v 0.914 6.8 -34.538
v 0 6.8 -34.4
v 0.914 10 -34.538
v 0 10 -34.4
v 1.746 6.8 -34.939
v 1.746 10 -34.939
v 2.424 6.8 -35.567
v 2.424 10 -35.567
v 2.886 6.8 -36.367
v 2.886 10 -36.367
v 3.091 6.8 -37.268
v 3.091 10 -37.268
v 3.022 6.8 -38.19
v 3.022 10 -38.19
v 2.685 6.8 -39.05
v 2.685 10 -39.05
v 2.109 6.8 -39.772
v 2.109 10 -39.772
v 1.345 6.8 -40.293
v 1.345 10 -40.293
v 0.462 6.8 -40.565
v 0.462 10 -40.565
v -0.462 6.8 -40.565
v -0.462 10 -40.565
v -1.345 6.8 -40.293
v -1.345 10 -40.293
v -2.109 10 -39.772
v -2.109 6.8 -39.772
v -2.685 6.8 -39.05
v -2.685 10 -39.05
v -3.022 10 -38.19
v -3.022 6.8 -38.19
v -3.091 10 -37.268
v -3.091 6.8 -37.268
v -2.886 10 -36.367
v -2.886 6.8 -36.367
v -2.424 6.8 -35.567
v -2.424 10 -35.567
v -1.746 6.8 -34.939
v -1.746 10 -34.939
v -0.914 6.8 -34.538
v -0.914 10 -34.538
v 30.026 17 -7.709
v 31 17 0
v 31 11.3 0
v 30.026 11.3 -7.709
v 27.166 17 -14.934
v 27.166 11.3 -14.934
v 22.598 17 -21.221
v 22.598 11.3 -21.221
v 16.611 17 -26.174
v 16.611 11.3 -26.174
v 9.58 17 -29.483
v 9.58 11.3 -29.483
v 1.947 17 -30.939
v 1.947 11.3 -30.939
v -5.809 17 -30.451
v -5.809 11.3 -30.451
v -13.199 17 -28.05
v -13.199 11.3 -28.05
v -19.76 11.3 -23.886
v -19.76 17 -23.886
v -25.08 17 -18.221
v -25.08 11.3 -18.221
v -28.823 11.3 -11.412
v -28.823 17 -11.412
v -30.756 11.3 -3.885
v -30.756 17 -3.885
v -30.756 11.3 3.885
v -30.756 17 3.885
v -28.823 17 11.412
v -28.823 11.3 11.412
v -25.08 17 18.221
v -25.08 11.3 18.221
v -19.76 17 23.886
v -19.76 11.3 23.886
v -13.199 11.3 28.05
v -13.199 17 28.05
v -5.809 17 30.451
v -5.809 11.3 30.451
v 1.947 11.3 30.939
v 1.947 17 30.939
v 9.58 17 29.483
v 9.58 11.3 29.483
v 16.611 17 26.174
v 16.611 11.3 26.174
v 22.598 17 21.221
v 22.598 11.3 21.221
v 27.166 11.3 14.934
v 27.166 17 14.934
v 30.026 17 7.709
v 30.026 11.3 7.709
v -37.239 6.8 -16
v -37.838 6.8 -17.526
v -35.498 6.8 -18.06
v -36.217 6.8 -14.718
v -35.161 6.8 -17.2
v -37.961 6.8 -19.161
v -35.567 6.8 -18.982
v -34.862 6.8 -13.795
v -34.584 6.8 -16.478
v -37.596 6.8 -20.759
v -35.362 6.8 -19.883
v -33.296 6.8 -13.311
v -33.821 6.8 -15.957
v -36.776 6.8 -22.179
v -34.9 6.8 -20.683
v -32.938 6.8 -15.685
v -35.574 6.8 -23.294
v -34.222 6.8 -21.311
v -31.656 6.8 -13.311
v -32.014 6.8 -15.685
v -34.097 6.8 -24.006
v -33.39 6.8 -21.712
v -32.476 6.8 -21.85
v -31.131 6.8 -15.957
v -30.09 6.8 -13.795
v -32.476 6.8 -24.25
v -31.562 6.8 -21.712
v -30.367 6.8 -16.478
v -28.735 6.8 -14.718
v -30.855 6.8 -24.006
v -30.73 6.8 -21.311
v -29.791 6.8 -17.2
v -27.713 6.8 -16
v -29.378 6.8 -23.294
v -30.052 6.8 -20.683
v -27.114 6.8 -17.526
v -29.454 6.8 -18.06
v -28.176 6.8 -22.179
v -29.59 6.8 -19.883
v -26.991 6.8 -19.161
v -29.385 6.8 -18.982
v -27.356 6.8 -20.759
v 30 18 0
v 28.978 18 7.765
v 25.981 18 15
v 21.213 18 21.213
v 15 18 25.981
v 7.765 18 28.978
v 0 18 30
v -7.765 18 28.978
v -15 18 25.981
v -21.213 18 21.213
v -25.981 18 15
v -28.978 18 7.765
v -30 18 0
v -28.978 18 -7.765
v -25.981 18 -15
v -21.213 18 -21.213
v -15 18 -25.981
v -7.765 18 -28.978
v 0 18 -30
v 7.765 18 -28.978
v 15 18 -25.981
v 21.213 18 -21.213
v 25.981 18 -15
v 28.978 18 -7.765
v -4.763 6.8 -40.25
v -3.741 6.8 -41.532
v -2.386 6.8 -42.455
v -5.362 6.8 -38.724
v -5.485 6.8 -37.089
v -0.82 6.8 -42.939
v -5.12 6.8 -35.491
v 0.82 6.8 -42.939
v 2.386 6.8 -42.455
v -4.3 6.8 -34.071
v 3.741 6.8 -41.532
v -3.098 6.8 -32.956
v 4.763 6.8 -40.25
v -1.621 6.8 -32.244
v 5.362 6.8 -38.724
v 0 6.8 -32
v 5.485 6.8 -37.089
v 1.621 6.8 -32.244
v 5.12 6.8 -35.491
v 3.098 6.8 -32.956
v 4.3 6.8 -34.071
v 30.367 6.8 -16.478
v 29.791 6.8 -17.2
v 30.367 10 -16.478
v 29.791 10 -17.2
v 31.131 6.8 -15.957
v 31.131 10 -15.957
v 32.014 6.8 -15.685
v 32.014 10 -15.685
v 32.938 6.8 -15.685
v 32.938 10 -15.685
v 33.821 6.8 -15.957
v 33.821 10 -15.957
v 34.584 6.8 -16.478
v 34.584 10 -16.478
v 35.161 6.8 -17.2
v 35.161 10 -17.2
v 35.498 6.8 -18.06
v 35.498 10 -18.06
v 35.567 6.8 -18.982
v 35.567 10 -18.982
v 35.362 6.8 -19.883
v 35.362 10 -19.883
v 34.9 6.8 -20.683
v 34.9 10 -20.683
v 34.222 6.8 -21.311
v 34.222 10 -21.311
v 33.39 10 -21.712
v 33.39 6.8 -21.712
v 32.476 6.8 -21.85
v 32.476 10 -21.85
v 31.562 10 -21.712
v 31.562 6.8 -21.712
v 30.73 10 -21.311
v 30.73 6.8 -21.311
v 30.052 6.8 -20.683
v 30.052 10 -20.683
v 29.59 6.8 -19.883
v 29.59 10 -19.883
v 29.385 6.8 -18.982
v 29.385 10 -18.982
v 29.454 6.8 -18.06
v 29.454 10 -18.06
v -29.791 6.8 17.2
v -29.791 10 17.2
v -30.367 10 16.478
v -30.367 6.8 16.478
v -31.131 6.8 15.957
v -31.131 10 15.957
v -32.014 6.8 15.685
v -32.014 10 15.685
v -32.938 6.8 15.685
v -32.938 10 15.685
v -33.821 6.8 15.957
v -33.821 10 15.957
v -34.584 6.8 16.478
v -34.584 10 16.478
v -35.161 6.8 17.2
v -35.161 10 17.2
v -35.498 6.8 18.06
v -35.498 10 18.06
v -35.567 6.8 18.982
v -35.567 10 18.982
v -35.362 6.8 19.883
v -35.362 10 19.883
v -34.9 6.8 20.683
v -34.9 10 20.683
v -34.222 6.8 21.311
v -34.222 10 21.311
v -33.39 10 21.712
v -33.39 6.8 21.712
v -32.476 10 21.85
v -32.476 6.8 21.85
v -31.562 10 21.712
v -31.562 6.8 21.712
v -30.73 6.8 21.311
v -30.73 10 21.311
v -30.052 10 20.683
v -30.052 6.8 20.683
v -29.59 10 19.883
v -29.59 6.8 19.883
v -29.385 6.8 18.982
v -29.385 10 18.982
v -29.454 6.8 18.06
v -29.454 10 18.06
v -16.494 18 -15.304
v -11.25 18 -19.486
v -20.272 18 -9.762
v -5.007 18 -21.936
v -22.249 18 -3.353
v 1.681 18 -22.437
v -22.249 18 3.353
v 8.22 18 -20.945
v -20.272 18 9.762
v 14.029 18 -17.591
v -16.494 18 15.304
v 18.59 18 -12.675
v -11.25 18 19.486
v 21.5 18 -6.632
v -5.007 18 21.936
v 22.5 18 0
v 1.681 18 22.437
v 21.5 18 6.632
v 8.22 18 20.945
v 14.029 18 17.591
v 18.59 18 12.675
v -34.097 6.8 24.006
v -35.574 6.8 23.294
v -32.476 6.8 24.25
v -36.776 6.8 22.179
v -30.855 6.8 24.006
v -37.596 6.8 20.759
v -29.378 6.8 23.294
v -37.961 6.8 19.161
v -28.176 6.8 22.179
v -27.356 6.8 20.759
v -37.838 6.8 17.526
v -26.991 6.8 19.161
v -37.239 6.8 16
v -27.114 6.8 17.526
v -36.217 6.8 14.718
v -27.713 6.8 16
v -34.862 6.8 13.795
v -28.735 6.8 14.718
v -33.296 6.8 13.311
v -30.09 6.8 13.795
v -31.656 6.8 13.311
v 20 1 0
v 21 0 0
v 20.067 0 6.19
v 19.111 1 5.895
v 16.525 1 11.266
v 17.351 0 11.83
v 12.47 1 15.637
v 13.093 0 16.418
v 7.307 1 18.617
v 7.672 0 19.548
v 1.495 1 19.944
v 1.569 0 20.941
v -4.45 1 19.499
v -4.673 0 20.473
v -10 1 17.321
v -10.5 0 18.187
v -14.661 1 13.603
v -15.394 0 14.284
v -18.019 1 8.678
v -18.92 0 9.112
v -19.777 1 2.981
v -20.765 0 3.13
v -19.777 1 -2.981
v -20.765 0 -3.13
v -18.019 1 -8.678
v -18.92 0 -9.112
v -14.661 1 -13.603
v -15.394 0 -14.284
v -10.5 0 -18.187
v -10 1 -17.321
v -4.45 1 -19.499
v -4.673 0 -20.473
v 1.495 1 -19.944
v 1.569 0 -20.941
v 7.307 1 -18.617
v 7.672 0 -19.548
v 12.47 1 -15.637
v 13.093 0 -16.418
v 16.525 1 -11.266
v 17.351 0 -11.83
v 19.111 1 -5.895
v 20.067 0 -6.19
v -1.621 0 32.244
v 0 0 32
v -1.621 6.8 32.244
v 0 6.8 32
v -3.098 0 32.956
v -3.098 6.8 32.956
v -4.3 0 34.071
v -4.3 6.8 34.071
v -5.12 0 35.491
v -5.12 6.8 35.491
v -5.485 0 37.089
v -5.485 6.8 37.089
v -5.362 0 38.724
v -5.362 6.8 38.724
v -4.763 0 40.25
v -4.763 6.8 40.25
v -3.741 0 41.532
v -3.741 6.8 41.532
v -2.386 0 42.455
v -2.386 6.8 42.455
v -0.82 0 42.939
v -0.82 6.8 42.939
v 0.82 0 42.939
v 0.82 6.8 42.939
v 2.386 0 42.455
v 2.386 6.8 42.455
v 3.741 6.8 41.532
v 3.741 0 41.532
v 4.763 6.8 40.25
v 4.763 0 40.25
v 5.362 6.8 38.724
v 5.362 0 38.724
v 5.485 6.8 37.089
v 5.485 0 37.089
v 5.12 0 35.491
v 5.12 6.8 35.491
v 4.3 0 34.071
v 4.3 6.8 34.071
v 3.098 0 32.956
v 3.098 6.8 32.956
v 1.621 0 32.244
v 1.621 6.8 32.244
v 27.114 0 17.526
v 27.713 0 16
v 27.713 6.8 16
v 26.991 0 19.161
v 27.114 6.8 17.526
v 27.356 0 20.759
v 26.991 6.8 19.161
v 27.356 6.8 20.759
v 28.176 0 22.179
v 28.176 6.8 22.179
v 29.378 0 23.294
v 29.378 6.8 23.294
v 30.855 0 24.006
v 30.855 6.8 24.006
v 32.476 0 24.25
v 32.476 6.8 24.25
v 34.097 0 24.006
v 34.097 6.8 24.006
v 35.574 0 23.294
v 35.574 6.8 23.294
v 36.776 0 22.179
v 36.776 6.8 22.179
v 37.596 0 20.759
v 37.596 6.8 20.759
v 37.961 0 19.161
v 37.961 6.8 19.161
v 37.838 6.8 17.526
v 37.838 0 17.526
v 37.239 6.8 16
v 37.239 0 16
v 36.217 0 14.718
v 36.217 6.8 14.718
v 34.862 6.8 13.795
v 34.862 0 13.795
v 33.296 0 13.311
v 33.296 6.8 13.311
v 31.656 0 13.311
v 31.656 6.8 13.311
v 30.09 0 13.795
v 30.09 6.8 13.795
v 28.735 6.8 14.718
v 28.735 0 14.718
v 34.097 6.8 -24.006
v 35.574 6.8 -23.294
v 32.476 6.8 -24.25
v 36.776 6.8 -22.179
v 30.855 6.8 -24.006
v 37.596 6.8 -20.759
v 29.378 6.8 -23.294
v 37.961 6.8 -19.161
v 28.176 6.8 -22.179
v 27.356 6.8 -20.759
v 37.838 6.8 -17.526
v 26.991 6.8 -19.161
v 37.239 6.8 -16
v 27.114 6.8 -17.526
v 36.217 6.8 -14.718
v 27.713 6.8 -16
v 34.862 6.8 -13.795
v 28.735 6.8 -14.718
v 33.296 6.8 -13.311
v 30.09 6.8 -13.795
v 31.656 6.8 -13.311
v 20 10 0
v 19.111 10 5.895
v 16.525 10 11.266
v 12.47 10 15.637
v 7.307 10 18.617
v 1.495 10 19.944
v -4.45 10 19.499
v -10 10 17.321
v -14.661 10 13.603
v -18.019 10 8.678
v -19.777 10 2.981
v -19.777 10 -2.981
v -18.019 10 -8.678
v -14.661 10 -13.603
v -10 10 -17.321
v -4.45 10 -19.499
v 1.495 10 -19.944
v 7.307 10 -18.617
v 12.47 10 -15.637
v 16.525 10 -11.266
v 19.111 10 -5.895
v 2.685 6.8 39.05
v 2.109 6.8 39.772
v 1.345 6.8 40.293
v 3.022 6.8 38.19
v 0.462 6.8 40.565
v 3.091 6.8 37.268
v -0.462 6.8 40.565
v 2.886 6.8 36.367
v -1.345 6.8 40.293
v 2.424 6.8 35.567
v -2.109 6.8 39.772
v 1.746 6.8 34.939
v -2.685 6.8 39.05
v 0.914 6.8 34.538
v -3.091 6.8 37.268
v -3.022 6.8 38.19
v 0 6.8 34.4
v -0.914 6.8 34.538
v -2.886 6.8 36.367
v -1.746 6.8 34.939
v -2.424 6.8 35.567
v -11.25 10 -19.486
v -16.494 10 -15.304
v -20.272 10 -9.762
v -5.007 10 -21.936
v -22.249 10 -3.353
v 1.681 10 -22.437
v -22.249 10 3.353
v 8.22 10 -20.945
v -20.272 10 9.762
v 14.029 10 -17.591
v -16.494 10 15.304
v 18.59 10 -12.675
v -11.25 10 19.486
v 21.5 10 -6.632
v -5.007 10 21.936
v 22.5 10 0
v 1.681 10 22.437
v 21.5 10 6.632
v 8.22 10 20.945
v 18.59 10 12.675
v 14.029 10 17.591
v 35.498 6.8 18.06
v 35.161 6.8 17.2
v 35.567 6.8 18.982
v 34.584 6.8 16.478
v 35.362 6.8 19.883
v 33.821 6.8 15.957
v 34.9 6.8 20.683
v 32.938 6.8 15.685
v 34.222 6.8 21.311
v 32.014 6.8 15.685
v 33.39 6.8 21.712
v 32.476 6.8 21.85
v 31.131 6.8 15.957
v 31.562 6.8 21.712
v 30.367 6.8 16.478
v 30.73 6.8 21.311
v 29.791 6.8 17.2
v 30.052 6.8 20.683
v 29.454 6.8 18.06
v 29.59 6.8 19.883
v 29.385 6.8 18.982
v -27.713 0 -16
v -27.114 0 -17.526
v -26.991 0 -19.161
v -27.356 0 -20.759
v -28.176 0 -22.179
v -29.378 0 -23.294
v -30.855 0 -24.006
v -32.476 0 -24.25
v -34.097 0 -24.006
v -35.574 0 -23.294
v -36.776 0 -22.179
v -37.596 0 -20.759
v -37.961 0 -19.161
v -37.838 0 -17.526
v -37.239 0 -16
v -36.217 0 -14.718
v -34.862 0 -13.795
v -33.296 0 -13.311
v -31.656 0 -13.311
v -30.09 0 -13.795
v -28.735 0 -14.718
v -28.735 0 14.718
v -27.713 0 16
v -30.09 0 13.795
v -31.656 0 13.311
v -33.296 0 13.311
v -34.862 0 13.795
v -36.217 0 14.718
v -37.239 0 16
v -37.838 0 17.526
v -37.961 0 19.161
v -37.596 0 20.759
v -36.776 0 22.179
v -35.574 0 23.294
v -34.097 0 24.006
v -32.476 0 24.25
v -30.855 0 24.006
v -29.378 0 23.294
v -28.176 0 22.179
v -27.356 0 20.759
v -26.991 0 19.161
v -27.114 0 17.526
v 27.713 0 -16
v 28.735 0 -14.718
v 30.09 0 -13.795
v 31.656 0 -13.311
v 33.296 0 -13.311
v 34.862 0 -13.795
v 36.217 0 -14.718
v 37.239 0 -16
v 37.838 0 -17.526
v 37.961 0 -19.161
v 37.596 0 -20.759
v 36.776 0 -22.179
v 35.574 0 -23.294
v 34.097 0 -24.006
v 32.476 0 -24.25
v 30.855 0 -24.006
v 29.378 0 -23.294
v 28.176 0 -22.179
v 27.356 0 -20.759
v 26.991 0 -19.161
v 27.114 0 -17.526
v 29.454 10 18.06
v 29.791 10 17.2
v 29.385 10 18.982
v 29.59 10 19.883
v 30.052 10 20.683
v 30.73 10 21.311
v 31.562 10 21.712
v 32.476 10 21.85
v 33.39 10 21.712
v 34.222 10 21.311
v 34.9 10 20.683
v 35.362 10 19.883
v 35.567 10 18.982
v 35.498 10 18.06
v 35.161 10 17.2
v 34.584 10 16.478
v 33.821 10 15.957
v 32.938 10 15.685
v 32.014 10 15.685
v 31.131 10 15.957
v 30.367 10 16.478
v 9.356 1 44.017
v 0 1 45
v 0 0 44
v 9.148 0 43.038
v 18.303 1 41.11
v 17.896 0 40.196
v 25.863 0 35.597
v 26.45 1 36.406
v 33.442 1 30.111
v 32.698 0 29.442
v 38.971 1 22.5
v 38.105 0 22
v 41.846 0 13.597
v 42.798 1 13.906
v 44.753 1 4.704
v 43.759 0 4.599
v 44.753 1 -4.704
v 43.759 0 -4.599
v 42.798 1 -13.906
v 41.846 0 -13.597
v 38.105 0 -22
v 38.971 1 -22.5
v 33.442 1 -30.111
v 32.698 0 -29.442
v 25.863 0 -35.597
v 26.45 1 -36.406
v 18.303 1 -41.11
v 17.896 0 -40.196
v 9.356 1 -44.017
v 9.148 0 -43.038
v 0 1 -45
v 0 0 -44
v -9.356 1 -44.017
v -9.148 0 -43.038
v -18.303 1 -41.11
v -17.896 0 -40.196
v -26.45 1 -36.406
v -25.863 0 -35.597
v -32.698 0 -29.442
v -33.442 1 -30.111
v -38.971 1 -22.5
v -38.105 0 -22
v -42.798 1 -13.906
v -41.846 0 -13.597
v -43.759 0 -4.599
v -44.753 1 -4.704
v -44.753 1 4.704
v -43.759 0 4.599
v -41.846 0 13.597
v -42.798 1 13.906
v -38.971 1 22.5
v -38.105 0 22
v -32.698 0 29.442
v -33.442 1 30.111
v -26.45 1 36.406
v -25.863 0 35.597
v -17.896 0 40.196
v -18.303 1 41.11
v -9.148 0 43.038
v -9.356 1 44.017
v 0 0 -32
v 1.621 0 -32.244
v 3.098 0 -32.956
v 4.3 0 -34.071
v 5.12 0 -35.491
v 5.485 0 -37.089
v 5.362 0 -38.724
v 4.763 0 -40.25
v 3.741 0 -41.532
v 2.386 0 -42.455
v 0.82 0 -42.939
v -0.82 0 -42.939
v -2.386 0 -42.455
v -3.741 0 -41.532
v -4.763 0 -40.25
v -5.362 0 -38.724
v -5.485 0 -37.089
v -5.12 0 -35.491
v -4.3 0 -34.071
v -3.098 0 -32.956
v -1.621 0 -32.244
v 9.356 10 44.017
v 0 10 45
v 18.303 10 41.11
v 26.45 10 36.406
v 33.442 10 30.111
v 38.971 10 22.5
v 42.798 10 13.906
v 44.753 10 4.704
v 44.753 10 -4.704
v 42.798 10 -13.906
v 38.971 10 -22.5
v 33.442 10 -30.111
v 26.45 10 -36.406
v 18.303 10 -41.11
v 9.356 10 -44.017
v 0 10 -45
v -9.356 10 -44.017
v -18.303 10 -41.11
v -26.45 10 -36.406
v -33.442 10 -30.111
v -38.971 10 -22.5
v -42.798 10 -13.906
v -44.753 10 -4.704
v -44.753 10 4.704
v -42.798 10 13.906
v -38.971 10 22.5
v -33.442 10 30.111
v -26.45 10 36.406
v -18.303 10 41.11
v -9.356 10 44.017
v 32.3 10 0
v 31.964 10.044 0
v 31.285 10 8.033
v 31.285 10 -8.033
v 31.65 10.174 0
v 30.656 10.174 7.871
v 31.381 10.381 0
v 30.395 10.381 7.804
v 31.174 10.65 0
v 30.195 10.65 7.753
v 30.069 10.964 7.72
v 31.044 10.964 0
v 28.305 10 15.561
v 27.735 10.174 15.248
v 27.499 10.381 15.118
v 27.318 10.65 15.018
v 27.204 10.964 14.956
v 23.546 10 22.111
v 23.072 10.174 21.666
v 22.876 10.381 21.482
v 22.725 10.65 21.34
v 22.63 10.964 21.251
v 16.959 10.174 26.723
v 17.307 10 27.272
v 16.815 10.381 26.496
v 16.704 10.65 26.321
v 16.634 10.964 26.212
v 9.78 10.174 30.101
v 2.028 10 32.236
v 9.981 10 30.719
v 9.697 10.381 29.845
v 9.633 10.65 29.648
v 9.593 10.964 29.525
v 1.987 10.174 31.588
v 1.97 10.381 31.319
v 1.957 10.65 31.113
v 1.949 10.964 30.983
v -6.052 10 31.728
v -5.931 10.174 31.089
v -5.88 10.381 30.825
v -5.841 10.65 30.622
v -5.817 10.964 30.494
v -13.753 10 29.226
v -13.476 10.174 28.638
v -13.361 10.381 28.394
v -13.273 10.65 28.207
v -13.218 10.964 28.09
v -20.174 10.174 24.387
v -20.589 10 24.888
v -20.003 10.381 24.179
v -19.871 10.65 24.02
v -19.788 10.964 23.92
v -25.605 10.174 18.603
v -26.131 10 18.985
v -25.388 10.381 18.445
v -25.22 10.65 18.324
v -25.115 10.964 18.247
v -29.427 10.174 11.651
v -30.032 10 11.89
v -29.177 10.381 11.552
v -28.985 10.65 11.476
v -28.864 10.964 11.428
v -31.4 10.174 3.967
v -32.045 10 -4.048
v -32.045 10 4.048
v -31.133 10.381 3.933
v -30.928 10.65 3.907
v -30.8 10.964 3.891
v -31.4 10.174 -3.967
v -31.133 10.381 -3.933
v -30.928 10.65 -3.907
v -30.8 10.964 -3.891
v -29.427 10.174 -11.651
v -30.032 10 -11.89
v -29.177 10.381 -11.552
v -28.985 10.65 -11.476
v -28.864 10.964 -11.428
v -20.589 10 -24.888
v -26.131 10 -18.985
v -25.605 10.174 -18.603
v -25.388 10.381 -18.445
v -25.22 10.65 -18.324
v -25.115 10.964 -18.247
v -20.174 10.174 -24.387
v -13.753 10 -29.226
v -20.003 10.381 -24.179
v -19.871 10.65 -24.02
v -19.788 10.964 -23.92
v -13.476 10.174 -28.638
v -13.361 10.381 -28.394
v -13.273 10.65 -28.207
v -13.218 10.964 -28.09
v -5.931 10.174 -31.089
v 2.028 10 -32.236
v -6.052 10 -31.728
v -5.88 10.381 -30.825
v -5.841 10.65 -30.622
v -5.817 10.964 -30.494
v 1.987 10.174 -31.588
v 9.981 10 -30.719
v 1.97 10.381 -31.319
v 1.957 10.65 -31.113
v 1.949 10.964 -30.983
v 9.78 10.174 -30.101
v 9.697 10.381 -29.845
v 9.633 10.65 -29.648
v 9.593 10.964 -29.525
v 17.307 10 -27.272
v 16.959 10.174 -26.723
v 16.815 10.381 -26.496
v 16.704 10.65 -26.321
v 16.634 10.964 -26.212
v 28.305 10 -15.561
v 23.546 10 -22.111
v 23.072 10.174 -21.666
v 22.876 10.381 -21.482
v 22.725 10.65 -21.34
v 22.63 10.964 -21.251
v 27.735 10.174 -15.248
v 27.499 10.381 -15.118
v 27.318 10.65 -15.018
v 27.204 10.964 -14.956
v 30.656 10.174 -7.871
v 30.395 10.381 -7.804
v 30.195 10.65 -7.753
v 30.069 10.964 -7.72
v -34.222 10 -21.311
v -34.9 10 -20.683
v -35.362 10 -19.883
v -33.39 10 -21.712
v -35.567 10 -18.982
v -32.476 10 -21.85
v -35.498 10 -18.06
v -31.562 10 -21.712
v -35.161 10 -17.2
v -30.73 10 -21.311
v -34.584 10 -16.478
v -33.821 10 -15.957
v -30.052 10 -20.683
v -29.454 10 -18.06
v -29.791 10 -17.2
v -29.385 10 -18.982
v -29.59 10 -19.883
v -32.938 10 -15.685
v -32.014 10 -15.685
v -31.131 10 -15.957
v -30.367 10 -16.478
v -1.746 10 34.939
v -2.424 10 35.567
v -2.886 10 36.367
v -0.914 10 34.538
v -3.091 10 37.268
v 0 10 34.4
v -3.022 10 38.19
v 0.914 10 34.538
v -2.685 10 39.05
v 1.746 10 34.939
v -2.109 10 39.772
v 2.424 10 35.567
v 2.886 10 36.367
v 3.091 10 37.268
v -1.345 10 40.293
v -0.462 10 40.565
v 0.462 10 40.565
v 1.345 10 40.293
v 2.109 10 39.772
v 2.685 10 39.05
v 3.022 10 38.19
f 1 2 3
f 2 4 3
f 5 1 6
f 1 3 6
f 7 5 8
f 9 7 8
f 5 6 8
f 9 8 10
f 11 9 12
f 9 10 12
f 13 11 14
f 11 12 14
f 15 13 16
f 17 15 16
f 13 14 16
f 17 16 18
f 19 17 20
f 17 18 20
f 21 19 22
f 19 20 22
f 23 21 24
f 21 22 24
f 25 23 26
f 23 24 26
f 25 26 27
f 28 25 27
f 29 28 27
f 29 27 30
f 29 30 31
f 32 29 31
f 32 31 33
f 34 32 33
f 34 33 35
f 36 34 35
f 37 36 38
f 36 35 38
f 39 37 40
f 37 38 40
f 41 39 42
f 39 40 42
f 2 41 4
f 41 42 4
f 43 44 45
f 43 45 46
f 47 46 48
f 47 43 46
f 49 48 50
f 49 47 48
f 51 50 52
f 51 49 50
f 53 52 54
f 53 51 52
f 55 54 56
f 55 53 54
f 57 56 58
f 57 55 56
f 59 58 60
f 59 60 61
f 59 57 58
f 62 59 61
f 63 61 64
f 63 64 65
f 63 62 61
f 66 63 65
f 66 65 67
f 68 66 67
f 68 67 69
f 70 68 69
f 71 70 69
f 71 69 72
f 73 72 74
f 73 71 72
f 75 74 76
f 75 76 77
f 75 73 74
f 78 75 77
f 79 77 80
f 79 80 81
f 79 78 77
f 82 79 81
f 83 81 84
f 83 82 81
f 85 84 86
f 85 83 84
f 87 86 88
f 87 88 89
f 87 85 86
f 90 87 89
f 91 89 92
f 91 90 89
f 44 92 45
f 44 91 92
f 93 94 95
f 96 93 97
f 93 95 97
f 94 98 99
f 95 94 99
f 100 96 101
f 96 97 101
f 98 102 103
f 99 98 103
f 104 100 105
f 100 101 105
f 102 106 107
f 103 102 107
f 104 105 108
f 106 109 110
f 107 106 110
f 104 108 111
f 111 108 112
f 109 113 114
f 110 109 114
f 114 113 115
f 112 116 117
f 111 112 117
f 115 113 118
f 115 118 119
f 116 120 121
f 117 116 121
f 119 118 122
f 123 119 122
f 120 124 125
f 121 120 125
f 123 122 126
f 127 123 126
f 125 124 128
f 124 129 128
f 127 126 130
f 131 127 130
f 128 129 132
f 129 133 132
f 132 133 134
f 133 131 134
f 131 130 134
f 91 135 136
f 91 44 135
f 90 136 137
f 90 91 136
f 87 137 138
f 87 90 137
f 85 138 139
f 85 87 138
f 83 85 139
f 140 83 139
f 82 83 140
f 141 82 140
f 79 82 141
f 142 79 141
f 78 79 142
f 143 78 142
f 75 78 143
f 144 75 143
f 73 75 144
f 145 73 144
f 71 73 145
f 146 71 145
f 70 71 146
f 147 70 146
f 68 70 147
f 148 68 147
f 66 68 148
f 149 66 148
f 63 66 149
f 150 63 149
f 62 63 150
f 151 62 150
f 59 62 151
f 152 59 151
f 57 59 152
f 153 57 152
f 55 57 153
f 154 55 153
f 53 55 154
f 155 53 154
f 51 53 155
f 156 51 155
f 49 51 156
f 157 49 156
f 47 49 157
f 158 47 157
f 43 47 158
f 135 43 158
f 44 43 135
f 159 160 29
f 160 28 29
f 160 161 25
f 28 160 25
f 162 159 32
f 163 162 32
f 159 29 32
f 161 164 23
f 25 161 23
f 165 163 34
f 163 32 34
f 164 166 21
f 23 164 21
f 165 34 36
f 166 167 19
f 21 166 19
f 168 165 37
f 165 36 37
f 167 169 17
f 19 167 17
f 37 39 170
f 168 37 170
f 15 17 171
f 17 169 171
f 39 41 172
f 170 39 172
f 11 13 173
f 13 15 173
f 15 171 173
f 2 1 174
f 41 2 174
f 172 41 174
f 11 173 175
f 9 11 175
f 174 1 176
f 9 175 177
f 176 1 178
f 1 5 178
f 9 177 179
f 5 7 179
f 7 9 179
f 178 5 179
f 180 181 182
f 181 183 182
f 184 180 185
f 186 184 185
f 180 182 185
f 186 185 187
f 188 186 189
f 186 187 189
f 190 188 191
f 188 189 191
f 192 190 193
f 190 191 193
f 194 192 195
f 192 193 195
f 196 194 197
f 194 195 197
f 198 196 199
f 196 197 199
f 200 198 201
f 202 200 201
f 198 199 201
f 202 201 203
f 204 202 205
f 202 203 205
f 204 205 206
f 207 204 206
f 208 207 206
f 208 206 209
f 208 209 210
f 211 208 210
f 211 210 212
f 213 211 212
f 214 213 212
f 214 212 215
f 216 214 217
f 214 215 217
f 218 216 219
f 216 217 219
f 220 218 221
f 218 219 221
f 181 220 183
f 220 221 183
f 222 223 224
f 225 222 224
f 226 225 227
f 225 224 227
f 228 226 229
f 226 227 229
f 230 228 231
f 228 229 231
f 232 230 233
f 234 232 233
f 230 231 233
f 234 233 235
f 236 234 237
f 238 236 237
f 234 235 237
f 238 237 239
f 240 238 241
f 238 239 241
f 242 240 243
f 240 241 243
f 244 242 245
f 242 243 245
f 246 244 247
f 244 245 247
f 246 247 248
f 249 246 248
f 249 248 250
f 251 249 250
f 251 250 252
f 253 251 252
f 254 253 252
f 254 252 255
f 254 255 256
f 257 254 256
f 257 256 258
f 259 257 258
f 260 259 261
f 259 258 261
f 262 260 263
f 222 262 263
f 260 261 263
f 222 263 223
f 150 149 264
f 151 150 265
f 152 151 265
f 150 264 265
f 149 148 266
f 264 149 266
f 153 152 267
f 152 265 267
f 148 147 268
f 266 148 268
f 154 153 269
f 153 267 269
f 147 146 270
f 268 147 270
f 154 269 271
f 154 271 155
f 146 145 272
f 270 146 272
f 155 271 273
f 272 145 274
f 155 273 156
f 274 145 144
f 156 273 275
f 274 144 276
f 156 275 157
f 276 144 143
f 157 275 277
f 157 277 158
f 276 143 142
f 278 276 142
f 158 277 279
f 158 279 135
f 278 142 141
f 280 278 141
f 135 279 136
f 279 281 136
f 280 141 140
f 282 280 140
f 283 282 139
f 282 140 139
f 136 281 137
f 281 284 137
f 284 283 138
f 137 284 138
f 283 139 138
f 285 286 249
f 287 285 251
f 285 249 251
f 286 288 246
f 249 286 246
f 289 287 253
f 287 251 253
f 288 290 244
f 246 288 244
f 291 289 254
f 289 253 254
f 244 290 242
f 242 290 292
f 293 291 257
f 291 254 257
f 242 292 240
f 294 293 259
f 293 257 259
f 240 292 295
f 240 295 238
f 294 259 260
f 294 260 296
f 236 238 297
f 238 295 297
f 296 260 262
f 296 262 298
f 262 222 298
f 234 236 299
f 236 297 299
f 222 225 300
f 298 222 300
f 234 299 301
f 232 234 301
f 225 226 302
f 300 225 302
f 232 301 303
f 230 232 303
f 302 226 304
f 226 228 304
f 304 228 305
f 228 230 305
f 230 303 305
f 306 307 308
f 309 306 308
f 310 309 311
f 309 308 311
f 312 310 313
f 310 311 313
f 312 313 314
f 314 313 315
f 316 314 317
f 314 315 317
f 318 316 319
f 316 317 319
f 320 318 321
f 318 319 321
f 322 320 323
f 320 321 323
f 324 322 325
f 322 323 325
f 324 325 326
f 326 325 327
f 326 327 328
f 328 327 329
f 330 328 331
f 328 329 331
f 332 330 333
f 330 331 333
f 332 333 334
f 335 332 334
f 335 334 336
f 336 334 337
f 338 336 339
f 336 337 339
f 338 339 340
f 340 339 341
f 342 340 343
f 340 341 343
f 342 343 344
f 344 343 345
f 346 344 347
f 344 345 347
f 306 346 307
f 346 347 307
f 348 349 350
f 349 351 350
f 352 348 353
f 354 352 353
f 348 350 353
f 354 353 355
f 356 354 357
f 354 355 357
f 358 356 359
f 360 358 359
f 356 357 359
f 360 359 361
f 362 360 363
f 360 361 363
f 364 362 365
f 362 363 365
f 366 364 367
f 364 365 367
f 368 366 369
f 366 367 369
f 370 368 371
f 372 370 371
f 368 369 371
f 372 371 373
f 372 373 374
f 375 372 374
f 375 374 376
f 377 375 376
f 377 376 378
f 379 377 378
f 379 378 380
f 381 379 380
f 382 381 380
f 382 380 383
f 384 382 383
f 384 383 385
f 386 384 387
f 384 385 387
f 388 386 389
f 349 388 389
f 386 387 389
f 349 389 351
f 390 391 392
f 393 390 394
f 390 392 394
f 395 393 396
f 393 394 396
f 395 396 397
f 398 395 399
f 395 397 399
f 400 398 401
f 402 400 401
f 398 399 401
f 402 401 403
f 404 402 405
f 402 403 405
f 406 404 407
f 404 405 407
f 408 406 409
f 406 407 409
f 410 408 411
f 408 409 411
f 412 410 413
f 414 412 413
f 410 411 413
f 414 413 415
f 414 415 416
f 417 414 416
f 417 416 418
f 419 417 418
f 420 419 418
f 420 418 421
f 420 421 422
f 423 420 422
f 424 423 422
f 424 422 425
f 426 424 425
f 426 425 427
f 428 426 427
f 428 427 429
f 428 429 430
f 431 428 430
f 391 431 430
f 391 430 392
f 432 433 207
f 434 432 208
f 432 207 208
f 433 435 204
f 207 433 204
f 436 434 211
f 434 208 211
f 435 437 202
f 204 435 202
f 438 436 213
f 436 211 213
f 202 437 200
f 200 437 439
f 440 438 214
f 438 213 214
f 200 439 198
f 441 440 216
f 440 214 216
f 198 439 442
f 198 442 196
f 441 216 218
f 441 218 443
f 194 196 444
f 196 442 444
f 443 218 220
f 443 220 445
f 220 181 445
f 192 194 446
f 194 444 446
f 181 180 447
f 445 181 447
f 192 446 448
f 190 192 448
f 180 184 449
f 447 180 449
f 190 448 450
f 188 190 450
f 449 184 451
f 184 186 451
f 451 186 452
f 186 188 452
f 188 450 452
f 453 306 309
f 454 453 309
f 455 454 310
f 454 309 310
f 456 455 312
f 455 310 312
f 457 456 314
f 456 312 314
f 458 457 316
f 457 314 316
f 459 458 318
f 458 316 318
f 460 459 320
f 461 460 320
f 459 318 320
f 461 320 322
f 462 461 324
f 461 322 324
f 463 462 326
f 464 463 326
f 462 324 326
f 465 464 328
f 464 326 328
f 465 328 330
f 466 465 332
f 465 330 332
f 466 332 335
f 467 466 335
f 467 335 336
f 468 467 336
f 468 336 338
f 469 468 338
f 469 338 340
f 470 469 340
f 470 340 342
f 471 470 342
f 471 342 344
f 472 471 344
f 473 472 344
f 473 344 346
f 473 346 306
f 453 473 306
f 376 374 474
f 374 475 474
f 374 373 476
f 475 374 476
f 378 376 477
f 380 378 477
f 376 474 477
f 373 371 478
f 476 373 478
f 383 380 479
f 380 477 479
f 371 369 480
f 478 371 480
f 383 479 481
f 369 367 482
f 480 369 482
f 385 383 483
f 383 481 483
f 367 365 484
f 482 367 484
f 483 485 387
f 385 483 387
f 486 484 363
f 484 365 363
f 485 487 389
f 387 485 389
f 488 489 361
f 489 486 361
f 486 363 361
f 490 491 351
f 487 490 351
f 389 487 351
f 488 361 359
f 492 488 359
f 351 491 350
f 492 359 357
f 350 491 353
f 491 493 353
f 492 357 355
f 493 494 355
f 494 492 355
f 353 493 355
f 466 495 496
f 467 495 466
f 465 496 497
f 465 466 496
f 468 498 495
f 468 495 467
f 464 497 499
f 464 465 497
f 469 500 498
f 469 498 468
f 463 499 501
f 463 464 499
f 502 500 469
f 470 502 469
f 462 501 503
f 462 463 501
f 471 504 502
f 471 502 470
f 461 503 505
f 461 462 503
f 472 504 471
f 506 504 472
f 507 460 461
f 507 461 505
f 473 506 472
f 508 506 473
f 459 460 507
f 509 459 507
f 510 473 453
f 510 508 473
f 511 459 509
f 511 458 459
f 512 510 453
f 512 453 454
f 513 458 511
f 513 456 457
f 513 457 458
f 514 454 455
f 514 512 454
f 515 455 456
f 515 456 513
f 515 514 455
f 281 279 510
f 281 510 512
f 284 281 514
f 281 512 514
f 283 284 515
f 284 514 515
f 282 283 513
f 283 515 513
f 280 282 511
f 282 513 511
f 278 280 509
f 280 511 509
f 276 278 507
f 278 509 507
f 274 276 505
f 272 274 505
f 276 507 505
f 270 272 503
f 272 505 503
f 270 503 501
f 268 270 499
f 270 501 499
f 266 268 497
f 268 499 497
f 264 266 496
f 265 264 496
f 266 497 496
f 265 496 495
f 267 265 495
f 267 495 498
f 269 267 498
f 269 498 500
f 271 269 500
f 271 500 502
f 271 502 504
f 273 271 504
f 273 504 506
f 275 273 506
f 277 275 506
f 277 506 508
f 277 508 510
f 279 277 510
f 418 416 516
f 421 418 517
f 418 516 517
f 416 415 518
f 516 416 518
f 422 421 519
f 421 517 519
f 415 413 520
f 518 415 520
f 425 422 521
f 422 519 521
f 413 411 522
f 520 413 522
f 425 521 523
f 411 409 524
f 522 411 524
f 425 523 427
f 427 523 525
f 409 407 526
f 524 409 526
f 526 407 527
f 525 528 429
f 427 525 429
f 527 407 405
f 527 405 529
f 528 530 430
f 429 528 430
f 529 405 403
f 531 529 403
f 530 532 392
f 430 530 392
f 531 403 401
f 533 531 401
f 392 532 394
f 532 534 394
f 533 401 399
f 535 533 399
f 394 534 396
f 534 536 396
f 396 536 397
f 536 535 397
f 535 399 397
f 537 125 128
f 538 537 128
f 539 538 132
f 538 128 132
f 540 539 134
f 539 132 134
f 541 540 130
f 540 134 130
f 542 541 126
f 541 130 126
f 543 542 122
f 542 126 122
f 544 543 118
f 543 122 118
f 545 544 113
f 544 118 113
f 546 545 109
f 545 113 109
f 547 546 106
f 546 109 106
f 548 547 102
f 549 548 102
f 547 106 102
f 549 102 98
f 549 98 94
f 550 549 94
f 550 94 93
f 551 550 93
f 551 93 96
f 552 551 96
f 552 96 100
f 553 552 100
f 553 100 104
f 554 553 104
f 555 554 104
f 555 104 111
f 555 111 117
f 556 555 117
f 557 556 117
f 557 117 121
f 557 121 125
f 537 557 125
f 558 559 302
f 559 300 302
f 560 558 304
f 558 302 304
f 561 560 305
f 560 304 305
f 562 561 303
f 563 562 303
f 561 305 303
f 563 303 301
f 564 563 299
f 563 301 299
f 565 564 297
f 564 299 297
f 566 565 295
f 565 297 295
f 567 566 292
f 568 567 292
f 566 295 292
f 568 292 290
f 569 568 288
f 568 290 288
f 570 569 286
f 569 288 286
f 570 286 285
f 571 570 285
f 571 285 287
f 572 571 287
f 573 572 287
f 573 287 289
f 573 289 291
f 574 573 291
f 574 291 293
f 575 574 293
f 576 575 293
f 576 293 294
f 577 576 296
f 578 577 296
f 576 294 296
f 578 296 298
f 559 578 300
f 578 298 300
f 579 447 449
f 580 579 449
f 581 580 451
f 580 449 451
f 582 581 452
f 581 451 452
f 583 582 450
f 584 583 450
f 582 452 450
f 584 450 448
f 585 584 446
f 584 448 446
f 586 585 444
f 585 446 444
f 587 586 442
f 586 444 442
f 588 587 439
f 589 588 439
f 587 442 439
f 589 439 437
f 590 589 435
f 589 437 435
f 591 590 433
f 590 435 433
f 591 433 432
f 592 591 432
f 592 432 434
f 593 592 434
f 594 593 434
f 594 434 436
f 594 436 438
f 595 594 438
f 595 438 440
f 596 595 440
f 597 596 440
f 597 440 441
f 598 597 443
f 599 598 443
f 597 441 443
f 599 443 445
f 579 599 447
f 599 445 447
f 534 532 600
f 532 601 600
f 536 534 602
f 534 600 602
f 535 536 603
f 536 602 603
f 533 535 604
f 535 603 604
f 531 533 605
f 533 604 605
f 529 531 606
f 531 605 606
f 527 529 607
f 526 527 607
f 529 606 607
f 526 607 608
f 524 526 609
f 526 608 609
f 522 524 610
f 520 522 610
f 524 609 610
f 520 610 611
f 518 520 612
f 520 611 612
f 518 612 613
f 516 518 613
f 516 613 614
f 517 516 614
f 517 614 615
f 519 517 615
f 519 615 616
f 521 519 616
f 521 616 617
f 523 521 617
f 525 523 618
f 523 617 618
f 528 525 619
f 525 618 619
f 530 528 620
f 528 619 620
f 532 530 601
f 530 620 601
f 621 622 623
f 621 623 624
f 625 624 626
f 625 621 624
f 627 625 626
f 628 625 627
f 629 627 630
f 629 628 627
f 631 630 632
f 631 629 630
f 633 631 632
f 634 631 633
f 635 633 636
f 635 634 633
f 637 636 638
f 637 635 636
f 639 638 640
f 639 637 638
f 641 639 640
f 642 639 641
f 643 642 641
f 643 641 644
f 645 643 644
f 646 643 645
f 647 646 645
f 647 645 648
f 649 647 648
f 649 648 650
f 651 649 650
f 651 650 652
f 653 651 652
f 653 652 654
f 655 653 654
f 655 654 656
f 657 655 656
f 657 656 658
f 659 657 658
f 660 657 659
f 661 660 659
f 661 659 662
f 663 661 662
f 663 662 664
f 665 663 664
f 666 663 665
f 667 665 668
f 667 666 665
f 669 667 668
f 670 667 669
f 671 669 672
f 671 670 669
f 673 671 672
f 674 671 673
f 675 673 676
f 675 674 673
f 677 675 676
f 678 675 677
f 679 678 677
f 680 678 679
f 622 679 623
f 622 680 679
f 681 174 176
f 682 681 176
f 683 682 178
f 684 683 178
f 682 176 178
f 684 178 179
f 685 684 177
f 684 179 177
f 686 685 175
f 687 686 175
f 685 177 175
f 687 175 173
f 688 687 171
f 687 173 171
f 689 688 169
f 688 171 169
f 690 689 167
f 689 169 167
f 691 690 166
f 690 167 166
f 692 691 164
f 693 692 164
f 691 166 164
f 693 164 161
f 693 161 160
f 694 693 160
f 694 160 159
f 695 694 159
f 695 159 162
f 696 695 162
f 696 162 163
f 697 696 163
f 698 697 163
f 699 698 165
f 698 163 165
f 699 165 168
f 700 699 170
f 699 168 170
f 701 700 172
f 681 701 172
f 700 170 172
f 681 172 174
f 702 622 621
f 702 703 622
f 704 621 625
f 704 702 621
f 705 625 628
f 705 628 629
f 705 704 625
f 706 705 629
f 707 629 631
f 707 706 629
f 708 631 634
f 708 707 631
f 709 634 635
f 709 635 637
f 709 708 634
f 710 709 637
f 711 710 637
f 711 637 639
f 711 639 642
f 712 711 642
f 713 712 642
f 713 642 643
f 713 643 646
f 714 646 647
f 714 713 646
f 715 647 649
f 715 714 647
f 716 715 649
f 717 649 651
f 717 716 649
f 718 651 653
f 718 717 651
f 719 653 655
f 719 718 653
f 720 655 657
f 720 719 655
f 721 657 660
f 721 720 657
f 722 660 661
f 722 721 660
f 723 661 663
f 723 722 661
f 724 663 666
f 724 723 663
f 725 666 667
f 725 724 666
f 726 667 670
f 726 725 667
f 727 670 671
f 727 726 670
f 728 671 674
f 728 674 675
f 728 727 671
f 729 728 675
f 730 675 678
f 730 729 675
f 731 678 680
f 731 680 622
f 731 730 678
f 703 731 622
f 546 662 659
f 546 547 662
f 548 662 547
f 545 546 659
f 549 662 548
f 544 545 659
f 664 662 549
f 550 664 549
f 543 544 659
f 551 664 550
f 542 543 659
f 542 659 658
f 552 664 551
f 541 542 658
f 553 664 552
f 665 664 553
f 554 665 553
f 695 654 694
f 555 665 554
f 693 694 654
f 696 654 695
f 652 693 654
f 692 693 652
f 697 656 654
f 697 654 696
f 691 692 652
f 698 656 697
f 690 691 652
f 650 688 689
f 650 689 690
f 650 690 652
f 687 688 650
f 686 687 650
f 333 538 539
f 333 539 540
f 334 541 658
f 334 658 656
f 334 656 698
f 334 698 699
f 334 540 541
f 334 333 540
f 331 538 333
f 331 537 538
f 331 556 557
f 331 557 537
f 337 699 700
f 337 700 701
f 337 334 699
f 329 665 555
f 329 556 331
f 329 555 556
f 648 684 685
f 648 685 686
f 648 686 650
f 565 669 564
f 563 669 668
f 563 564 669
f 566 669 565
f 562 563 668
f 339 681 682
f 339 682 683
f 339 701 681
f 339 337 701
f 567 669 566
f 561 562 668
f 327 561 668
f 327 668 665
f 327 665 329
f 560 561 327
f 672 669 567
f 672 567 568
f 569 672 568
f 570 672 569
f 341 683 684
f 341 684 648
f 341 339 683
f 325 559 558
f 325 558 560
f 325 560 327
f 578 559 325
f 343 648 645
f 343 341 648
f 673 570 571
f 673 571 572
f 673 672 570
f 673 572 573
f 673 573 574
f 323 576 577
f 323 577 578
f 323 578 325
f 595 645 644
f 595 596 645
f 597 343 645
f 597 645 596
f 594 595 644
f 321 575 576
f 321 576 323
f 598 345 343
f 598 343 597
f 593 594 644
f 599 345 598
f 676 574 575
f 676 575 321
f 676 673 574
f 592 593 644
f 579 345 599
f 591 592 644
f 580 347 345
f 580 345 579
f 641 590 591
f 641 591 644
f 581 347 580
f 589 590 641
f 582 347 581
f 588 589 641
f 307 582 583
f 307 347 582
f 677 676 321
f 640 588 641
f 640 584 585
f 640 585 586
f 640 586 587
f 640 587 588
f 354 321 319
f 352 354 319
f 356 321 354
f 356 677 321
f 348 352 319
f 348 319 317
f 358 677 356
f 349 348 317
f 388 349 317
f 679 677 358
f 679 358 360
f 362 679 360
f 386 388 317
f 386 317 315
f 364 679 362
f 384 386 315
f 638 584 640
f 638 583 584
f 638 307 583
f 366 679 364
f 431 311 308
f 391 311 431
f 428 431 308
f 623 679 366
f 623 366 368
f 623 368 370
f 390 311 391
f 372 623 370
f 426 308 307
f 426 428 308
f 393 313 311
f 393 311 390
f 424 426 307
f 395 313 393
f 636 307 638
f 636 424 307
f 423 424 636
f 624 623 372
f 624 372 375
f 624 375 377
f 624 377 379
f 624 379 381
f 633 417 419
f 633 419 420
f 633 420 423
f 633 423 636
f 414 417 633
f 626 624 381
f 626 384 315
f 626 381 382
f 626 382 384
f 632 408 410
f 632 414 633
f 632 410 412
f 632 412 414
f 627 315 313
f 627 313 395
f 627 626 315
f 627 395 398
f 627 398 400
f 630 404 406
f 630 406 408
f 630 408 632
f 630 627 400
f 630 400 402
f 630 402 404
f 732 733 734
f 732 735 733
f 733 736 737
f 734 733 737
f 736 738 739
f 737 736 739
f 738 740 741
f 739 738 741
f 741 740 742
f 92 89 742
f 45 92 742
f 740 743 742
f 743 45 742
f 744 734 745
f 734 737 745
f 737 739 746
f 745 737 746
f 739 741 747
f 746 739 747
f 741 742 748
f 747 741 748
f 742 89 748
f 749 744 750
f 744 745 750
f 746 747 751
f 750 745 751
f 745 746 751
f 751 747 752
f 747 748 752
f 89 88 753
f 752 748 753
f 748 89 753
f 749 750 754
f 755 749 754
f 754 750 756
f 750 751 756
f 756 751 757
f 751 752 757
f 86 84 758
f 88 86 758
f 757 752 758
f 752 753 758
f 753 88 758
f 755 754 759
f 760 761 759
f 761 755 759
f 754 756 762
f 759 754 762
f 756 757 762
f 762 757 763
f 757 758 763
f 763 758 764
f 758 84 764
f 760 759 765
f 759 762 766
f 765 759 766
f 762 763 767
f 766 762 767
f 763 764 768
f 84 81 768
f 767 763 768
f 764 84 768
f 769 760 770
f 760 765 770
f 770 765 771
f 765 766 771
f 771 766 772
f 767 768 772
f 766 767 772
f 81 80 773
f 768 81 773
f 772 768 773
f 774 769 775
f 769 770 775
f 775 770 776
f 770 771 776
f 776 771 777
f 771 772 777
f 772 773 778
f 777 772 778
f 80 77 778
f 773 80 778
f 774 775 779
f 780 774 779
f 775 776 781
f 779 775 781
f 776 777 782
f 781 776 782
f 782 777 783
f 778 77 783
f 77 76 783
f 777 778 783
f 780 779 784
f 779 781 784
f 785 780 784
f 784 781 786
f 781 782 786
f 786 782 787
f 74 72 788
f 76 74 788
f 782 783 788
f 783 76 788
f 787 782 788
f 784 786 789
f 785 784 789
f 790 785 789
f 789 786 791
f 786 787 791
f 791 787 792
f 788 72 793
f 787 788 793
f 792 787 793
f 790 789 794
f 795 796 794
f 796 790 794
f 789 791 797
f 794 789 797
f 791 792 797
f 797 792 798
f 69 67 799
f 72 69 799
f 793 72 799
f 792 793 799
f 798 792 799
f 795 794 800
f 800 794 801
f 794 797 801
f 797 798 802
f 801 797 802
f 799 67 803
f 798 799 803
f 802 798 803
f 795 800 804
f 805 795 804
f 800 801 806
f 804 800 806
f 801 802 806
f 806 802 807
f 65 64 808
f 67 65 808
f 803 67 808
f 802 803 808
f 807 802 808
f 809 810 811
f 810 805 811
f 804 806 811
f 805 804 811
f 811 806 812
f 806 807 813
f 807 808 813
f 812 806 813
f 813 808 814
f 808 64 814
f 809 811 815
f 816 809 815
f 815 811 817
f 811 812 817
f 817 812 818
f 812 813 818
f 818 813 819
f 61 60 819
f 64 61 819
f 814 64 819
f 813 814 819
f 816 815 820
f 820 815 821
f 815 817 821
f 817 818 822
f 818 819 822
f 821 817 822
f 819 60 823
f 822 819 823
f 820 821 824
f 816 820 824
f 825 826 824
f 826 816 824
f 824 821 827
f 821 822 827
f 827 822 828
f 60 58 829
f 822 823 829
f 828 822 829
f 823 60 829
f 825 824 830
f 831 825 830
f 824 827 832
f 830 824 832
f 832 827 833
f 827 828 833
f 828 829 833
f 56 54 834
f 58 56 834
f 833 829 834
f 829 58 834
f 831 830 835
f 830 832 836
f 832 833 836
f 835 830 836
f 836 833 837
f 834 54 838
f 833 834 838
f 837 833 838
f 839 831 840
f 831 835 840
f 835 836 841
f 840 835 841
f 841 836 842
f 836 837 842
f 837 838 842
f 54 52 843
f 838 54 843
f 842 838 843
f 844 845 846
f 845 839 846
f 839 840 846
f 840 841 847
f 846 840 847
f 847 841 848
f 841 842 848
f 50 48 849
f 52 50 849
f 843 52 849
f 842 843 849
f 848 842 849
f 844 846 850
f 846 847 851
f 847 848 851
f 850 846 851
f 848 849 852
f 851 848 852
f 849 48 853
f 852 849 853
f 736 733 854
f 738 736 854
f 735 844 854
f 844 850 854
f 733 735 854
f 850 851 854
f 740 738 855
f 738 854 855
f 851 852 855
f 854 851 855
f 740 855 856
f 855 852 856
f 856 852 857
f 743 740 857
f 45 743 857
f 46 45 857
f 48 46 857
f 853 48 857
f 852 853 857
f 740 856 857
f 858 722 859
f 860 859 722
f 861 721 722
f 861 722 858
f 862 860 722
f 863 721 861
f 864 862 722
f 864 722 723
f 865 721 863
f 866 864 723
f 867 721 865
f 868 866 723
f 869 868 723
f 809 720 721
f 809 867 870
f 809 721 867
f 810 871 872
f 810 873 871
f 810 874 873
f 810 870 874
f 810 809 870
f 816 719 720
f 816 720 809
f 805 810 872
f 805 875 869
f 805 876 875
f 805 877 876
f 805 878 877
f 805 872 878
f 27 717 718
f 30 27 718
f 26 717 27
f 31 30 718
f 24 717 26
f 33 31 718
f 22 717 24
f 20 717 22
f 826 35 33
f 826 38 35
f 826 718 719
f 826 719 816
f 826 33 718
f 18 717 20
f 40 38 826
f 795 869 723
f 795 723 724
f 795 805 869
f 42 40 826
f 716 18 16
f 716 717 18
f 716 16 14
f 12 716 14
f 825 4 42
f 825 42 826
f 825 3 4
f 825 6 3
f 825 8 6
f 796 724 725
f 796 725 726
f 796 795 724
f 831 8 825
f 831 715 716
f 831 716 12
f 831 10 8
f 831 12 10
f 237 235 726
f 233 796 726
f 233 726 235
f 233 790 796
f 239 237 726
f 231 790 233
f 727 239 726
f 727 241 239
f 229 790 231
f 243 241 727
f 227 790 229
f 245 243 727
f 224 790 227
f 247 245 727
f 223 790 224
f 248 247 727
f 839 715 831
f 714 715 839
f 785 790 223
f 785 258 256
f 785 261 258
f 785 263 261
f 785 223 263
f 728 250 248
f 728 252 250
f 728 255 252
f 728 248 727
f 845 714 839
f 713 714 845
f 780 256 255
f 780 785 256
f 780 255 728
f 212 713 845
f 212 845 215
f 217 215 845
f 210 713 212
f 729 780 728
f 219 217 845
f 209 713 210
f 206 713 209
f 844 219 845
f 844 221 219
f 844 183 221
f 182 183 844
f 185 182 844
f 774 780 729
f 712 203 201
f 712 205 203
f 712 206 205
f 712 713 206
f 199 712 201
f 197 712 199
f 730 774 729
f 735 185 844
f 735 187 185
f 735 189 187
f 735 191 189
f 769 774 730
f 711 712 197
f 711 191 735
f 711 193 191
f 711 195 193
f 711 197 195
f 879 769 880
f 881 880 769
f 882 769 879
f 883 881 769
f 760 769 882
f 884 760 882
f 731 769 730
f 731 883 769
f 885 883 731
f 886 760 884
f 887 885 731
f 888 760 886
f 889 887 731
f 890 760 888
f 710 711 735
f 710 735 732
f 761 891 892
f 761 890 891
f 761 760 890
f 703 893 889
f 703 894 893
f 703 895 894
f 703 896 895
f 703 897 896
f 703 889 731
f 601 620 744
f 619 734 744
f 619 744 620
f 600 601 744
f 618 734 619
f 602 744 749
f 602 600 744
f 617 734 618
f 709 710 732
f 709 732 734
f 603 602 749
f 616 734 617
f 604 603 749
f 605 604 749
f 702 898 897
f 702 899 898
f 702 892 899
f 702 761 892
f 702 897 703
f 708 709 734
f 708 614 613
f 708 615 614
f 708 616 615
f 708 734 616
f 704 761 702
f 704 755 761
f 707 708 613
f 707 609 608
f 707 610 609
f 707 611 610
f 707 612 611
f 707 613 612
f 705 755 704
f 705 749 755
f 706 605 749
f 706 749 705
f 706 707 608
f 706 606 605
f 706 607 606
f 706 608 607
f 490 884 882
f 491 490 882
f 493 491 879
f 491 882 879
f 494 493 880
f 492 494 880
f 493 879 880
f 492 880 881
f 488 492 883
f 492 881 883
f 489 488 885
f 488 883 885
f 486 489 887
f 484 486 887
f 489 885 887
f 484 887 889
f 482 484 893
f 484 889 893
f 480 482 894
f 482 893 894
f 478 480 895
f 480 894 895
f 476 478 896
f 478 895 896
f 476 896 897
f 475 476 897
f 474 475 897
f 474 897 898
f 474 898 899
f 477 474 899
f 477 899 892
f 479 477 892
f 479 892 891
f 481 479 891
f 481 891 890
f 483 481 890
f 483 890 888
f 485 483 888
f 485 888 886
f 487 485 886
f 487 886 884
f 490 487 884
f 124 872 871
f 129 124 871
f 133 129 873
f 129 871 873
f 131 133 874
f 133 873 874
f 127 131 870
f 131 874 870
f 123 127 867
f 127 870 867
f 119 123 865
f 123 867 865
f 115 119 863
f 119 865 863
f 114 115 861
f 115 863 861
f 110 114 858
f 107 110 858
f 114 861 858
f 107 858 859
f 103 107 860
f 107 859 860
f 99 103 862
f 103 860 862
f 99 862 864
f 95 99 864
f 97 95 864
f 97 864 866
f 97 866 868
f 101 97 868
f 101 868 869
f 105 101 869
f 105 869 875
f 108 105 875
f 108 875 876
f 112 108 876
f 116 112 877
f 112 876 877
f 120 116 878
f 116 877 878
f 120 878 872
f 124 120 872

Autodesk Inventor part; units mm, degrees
ref_plane "YZ Plane" through (0, 0, 0) normal (1, 0, 0) x (0, 1, 0)
ref_plane "XZ Plane" through (0, 0, 0) normal (0, 1, 0) x (-1, 0, 0)
ref_plane "XY Plane" through (0, 0, 0) normal (0, 0, 1) x (1, 0, 0)
sketch "Эскиз1" plane through (0, 0, 0) normal (0, 0, 1) x (1, 0, 0)
  line L0 (0, 8.5) -> (0, 0)
  line L1 (0, 0) -> (31, 0)
  line L2 (31, 0) -> (31, 18)
  line L3 (31, 18) -> (22.5, 18)
  line L4 (22.5, 18) -> (22.5, 8.5)
  line L5 (22.5, 8.5) -> (0, 8.5)
  dimension "d0" = 18
  dimension "d3" = 31
  dimension "d28" = 22.5
revolve "Вращение1" add sketch "Эскиз1" angle 360 about axis through (0, 8.5, 0) along (0, -1, 0)
sketch "Эскиз2" plane through (0, 0, 0) normal (1, 0, 0) x (0, 1, 0)
  line L0 (0, 31) -> (0, -31) projected
  line L1 (18, 31) -> (0, 31) projected
  line L2 (18, 31) -> (0, 31) projected
  line L3 (0, 0) -> (0, 45)
  line L4 (0, 45) -> (10, 45)
  line L5 (10, 45) -> (10, 0)
  line L6 (10, 0) -> (0, 0)
  line L7 (-3, 0) -> (18, 0) projected
  dimension "d5" = 10
  dimension "d6" = 45
revolve "Вращение2" add sketch "Эскиз2" angle 360 about axis through (0, -10, 0) along (0, 1, 0)
sketch "Эскиз3" plane through (0, 0, 0) normal (0, -1, 0) x (1, 0, 0)
  line L0 (0, -63) -> (0, 63) projected
  line L1 (-63, 0) -> (63, 0) projected
  circle A0 centre (0, 0) radius 37.5 construction
  circle A1 centre (0, 37.5) radius 5.5
  point P0 (0, 0)
  dimension "d8" = 75
  dimension "d9" = 11
hole "Отверстие1" at (0, 0, 37.5) direction (0, 1, 0) diameter 6.2 depth 15 tip angle 118 counterbore diameter 11 counterbore depth 6.8
pattern_circular "Круговой массив1" count 6 over 360 about axis through (0, -10, 0) along (0, 1, 0) of "Отверстие1"
fillet "Сопряжение1" radius 1.3 1 edges at (-31, 10, 0)
chamfer "Фаска1" distance 1 angle 45 1 edges at (0, 0, -45)
sketch "Эскиз5" plane through (0, 0, 0) normal (0, -1, 0) x (1, 0, 0)
  line L0 (0, 63) -> (0, -63) projected
  line L1 (-63, 0) -> (63, 0) projected
  circle A0 centre (0, 0) radius 20
  point P0 (0, 0)
  dimension "d25" = 40
extrude "Выдавливание1" cut sketch "Эскиз5" against normal blind 15
chamfer "Фаска2" distance 1 angle 45 1 edges at (-20, 0, 0)
chamfer "Фаска3" distance 1 angle 45 1 edges at (-31, 18, 0)
properties part number "Крышка маленькая_под манж_01"
